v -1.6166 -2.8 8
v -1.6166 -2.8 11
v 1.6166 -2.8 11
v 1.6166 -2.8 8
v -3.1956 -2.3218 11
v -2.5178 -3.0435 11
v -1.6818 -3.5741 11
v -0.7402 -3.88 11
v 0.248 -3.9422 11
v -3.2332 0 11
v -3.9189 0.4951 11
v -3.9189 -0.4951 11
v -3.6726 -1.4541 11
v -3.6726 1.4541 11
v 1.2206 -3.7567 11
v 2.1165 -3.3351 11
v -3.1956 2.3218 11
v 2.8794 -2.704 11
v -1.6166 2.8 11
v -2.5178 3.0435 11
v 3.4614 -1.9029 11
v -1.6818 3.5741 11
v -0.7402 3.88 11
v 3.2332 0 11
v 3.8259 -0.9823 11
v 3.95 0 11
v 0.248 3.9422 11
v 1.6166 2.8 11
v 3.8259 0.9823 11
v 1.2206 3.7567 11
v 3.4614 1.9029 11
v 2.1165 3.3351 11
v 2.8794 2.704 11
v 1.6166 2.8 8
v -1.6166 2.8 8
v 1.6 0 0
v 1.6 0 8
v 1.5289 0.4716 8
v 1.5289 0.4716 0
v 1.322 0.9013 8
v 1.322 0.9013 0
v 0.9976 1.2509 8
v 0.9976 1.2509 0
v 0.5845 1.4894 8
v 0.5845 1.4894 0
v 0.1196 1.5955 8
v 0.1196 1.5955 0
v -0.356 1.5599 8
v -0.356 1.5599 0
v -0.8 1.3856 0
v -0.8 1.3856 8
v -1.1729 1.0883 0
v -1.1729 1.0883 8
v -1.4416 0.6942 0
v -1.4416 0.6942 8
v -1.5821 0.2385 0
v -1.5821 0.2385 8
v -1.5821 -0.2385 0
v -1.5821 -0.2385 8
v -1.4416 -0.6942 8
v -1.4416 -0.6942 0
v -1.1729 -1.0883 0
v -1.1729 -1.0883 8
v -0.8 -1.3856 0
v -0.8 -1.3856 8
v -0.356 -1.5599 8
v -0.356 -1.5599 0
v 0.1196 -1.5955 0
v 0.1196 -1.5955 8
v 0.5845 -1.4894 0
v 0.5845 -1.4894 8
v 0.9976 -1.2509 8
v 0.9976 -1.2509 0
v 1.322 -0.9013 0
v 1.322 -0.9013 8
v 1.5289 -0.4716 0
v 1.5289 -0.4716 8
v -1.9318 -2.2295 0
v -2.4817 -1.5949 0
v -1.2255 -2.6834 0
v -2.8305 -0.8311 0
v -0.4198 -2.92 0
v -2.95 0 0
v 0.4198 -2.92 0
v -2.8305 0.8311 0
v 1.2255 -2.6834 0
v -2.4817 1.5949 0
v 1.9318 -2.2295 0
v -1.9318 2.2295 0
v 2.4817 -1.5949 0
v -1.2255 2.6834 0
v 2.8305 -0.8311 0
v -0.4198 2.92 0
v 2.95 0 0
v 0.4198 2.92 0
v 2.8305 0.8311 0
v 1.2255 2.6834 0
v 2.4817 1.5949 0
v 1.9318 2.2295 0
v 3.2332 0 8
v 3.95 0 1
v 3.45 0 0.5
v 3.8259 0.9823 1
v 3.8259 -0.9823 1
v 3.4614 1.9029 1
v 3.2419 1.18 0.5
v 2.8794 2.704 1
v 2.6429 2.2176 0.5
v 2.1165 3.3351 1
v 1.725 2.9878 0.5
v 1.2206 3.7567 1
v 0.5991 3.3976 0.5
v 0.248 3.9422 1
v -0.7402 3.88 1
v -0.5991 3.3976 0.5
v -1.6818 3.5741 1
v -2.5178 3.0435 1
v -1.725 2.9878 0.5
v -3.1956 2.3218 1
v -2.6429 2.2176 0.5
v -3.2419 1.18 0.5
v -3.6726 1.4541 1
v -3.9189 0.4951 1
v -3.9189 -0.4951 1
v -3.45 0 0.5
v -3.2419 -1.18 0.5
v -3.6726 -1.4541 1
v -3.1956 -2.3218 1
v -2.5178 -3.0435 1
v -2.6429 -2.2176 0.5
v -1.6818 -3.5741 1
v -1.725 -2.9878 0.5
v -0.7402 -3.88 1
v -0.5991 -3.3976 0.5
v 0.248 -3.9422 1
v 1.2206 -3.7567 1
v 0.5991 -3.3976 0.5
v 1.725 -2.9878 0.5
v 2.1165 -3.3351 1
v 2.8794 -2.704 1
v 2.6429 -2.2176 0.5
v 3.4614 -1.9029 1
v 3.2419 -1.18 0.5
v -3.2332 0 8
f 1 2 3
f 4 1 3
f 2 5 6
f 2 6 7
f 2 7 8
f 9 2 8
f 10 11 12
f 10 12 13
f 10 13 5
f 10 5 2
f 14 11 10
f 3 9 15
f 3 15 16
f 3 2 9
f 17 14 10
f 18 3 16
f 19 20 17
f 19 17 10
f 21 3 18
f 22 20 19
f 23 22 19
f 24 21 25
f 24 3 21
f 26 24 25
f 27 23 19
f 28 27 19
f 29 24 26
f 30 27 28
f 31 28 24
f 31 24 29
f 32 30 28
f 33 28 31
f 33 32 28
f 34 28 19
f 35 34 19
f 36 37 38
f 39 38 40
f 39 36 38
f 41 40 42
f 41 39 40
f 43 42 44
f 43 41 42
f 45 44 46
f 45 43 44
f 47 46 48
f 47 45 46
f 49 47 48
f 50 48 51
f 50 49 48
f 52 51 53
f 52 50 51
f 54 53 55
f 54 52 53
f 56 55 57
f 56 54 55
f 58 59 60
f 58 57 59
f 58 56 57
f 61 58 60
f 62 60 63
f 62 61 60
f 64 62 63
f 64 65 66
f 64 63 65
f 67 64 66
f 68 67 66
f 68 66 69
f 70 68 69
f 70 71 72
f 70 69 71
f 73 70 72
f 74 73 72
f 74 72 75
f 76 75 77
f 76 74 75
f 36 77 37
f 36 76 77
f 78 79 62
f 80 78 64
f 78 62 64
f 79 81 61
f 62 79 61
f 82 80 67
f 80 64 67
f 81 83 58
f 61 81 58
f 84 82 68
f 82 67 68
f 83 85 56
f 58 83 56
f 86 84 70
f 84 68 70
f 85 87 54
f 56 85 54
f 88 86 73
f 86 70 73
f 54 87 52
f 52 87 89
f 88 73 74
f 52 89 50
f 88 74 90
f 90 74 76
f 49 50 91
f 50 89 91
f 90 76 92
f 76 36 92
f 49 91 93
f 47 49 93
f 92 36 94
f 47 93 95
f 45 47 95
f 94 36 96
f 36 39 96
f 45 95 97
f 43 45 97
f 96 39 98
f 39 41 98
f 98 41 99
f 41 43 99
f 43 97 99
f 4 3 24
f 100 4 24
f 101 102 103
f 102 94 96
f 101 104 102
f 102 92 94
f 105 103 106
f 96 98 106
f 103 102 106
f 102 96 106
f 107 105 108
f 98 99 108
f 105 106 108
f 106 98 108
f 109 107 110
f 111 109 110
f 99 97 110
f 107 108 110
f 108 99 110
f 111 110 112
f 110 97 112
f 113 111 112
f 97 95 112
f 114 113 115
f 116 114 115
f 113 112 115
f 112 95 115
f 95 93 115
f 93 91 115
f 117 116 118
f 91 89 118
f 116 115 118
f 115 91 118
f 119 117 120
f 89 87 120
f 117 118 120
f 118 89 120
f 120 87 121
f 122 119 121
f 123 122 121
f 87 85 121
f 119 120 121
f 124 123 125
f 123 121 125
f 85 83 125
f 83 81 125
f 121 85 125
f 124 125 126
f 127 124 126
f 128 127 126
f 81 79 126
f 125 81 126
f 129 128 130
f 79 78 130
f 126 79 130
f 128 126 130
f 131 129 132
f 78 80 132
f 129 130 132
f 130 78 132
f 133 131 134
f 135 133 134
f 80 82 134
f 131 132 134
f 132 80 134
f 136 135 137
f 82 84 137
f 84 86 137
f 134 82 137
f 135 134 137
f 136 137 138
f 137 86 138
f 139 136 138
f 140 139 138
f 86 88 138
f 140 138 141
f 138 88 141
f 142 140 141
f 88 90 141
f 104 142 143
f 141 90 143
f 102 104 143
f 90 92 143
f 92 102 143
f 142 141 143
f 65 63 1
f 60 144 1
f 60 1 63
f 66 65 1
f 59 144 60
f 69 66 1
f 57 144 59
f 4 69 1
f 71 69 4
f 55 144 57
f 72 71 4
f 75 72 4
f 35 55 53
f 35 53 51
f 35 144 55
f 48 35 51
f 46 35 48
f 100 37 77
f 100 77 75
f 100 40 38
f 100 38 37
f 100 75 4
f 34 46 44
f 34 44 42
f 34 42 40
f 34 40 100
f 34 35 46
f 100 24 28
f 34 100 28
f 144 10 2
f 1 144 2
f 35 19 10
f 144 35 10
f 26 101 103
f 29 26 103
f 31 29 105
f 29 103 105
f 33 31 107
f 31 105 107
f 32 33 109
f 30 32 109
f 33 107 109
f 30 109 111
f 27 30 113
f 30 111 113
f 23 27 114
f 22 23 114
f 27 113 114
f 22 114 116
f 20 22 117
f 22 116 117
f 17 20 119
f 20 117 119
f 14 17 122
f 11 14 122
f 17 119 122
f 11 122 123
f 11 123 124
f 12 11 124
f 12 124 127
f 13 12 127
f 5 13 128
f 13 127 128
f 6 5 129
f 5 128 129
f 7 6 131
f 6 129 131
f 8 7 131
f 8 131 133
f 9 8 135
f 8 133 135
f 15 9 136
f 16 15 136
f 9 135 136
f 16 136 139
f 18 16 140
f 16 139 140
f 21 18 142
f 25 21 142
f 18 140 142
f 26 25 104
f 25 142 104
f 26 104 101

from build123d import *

# Parameters (mm, degrees)
SKETCH_R     = 3.95
SKETCH_R_2   = 1.6
PAD_DEPTH    = 11
CHAMFER_SIZE = 1
POCKET_DEPTH = 3


with BuildPart() as part:
    # Sketch → Pad (new body)
    with BuildSketch(Plane.XY):
        Circle(SKETCH_R)
        Circle(SKETCH_R_2, mode=Mode.SUBTRACT)
    extrude(amount=PAD_DEPTH)

    # Chamfer
    chamfer_edges = [part.edges().sort_by_distance(p)[0] for p in [
        (-3.95, 0, 0),
    ]]
    chamfer(chamfer_edges, length=CHAMFER_SIZE)

    # Sketch001 (on Face3 of Chamfer) → Pocket (cut)
    with BuildSketch(Plane.XY.offset(11)):
        Polygon((1.616581, 2.8), (-1.616581, 2.8), (-3.233162, 0), (-1.616581, -2.8), (1.616581, -2.8), (3.233162, 0), align=None)
    extrude(amount=-POCKET_DEPTH, mode=Mode.SUBTRACT)


solid = part.part
